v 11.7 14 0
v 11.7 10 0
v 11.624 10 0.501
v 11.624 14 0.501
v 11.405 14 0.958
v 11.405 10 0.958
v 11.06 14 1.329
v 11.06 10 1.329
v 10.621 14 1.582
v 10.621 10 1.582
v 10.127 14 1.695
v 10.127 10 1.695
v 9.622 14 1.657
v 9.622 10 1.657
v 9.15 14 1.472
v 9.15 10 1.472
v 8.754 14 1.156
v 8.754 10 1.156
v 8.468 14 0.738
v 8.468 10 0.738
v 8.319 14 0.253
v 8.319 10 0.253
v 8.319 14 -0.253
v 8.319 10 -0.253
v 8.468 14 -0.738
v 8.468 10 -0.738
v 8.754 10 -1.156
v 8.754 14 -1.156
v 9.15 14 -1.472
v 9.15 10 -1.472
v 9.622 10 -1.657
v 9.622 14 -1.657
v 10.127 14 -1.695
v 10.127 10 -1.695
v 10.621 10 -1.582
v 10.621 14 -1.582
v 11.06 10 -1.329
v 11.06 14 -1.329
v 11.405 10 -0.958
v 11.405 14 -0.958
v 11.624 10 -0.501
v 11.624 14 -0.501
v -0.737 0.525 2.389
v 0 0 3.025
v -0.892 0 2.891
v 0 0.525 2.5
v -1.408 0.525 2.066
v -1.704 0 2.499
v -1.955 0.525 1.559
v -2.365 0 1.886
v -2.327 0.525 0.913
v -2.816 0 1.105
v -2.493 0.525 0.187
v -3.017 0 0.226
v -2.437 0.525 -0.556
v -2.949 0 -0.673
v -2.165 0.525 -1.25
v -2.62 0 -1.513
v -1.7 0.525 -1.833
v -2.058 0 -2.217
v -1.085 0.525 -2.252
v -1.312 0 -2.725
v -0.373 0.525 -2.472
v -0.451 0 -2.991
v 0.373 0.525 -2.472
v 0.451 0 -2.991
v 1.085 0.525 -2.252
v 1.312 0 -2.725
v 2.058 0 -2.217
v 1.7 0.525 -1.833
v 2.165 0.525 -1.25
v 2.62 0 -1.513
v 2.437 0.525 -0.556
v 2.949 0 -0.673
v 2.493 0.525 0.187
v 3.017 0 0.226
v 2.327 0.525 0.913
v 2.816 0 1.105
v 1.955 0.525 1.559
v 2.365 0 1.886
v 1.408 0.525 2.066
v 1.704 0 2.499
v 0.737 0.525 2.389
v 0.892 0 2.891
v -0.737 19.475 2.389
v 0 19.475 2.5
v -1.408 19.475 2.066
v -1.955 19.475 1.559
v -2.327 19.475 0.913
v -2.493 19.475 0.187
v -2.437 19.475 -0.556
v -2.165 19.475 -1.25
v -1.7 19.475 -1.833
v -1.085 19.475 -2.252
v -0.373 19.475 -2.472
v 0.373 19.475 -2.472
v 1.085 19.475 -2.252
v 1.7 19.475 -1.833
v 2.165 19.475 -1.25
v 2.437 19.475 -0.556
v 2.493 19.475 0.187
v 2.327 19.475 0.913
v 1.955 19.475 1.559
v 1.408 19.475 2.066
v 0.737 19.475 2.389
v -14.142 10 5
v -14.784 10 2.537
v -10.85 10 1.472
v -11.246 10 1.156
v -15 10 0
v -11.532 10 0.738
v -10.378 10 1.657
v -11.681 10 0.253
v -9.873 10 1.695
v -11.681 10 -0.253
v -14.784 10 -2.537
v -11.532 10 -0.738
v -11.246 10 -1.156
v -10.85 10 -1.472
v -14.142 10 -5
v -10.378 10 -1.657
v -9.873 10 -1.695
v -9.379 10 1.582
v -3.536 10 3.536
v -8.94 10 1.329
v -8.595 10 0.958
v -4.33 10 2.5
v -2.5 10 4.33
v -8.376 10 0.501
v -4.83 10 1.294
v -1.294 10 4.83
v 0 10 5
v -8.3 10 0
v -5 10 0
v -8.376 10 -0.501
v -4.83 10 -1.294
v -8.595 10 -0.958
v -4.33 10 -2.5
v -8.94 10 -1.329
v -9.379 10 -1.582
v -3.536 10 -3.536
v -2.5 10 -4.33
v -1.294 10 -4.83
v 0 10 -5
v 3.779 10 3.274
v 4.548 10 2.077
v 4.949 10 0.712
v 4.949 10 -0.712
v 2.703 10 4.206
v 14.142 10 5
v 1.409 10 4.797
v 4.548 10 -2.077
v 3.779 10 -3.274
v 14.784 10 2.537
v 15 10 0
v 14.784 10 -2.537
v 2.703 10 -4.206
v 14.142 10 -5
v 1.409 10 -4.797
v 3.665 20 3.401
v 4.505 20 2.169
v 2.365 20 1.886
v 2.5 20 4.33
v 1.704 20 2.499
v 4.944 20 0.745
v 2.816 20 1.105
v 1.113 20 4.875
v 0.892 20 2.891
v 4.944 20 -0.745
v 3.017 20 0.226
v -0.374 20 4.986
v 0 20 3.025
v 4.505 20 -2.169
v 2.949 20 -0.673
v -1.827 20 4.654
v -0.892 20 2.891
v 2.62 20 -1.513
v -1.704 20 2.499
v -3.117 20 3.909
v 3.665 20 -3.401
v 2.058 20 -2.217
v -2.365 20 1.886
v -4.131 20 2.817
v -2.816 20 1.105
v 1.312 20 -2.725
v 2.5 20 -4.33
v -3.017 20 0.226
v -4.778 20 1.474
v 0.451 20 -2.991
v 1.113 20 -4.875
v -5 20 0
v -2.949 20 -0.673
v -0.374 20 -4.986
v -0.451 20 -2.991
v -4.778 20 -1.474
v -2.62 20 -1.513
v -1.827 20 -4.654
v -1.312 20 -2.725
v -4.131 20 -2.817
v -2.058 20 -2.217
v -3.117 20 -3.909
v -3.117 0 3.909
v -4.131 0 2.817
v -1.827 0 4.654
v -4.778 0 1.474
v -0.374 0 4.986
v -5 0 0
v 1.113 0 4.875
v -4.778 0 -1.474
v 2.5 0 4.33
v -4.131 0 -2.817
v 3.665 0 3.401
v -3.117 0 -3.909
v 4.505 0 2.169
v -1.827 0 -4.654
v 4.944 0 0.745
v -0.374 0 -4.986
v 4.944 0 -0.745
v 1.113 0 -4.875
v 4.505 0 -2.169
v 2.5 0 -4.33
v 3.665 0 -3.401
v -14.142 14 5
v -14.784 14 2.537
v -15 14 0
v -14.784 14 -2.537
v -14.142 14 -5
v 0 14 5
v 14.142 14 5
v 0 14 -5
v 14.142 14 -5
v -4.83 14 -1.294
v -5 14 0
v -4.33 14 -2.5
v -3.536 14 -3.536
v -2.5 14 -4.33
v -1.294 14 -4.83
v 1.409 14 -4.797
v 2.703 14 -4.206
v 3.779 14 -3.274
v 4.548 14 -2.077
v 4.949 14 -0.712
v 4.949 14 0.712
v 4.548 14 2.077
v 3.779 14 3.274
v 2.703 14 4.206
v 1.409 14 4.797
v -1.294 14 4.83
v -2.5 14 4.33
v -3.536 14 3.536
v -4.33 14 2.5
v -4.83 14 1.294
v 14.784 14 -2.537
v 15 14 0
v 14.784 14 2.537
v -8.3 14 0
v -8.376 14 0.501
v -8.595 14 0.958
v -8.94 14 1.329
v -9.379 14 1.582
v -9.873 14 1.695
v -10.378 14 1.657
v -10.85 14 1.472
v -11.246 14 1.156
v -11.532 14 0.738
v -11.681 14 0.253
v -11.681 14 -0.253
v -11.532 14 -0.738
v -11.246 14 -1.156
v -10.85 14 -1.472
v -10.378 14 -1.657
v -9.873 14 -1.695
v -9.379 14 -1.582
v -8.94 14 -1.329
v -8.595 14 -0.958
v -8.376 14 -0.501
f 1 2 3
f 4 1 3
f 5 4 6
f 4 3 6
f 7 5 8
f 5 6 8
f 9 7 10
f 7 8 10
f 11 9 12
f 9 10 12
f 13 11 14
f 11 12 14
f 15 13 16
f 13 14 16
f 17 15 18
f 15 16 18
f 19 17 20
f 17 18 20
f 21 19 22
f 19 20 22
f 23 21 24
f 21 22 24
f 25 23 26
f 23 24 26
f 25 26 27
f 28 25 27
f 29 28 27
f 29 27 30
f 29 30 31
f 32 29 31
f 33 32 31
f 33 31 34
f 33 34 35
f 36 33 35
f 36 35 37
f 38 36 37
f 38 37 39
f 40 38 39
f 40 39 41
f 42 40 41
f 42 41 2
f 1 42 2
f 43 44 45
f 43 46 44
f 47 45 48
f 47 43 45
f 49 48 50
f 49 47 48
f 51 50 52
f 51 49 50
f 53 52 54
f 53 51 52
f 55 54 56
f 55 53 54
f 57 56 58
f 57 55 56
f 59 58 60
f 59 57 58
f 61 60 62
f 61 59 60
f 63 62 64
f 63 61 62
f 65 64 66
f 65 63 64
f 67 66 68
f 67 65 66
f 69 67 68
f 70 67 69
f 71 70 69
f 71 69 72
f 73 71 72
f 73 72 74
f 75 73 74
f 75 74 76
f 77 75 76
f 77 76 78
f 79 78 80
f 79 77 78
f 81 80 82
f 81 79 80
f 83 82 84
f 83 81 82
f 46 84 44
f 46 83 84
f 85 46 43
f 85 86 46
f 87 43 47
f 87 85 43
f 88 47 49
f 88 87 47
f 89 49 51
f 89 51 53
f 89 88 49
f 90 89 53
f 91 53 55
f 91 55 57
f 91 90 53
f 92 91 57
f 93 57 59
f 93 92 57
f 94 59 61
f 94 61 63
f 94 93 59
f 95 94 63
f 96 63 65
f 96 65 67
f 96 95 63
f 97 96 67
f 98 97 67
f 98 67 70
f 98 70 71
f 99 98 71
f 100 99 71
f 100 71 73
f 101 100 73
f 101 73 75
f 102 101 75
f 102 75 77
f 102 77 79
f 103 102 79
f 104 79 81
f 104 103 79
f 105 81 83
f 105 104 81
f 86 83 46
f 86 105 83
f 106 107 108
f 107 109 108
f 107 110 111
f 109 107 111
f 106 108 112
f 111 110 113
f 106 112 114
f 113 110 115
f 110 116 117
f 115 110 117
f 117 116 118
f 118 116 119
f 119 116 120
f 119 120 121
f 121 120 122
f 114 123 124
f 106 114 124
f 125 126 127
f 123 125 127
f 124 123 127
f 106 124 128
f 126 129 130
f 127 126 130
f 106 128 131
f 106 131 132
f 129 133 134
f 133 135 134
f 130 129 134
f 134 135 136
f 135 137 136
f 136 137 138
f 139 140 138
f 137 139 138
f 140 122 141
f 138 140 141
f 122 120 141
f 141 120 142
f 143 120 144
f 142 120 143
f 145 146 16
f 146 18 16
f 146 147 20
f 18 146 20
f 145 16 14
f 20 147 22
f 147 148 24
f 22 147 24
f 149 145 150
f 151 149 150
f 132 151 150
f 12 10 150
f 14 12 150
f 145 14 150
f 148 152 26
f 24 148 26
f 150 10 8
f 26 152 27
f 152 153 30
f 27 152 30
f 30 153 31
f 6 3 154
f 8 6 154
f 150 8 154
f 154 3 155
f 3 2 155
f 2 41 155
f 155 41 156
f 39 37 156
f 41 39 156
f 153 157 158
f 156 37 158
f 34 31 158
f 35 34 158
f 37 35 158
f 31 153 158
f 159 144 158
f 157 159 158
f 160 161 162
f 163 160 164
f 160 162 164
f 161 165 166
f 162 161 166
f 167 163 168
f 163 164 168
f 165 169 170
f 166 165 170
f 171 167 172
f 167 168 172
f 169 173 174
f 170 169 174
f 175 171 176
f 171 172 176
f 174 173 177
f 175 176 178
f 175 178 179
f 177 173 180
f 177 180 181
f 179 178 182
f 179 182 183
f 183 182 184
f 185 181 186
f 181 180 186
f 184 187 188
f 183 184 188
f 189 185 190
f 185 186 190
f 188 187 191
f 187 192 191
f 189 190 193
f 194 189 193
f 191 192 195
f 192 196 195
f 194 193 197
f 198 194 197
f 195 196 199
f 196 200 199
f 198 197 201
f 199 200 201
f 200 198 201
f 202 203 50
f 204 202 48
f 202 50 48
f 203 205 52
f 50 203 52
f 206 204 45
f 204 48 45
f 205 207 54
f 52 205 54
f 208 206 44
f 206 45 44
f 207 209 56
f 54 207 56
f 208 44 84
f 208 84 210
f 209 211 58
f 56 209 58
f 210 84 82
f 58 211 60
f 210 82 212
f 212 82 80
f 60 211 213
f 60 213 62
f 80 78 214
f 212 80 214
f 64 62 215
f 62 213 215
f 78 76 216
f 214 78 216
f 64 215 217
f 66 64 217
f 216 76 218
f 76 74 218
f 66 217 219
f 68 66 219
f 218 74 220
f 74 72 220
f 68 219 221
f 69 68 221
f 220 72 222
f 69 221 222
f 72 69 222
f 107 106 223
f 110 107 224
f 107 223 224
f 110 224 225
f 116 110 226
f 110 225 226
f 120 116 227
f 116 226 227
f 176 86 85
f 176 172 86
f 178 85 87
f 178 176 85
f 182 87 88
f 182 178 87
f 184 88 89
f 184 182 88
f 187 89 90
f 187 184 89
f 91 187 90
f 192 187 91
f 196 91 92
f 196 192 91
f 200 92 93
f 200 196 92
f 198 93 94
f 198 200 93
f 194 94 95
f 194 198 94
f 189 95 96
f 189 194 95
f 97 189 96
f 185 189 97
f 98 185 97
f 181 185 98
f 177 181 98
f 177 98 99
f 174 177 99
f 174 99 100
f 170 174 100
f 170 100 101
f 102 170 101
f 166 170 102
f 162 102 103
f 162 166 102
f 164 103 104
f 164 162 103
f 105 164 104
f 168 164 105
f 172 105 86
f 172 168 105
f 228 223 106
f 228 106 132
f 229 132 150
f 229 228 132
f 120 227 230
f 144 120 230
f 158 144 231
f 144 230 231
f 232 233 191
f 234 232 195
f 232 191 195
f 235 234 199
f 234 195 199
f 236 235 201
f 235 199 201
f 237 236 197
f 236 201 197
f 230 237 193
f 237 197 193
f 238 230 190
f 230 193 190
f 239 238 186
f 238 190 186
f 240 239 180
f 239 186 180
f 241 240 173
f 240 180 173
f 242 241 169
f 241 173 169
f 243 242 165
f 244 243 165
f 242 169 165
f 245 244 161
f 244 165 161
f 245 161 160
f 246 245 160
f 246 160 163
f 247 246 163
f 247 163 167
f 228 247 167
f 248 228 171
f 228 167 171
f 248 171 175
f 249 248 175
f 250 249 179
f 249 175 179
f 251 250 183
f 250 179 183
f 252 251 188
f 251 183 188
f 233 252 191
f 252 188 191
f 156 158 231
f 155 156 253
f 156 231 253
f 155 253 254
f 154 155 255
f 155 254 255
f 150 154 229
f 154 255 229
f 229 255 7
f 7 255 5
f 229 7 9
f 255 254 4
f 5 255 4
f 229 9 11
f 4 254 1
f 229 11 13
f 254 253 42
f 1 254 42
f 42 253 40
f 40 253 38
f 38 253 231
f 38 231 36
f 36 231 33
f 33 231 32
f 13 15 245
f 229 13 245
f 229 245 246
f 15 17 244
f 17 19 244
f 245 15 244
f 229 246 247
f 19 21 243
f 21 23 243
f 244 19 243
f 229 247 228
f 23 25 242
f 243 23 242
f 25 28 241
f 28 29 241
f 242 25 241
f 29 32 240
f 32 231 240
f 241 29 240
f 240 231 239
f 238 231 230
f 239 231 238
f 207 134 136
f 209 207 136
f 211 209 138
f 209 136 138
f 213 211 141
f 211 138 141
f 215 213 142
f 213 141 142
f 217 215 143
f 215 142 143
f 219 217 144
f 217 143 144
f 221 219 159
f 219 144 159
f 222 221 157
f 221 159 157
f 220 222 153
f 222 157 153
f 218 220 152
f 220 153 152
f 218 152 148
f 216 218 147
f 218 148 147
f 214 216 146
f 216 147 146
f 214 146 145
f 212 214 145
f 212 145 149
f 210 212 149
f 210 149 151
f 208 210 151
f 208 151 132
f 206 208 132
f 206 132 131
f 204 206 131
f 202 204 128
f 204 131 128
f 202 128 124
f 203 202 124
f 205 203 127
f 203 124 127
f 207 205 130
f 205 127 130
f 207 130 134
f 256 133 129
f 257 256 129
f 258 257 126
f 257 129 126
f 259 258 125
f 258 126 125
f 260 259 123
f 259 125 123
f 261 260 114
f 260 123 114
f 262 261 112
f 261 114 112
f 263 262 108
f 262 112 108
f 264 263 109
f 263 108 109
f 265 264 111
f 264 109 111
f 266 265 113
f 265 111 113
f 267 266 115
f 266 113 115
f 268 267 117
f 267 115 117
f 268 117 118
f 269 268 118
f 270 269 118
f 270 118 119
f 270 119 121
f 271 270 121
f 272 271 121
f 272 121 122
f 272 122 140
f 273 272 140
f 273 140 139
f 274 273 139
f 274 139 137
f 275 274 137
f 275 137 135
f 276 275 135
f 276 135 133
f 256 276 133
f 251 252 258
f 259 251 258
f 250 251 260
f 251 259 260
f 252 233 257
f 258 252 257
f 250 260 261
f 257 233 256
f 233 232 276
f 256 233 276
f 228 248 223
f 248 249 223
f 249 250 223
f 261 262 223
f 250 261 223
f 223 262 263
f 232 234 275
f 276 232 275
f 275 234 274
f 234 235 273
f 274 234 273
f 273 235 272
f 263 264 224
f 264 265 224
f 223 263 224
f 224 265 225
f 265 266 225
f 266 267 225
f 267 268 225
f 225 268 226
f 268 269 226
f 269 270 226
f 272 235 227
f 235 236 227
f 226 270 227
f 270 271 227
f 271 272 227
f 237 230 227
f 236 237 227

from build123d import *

# Parameters (mm, degrees)
M3_CLEARANCE_HOLE1_D = 3.4
SKETCH9_OUTSIDE_W    = 41.38
SKETCH9_OUTSIDE_H    = 41.38
SKETCH9_OUTSIDE_W_2  = 30
SKETCH9_OUTSIDE_H_2  = 10
CUT_EXTRUDE1_DEPTH   = 26.416530054


with BuildPart() as part:
    # Sketch2 → Revolve1 (revolve)
    with BuildSketch(Plane.XY):
        Polygon((0, 0), (-5, 0), (-5, 10), (-15, 10), (-15, 14), (-5, 14), (-5, 20), (0, 20), align=None)
    revolve(axis=Axis((0, 20, 0), (0, -1, 0)))

    # M3 Clearance Hole1 (through all)
    with Locations(Plane(origin=(0, 14, 0), x_dir=(-1, 0, 0), z_dir=(0, 1, 0))):
        with Locations((10, 0), (-10, 0)):
            Hole(M3_CLEARANCE_HOLE1_D / 2)

    # Sketch8 → M6 Tapped Hole1 (revolve, cut)
    with BuildSketch(Plane(origin=(0, 20, 0), x_dir=(0, 0, 1), z_dir=(1, 0, 0))):
        Polygon((0, 0), (0, 20), (3.025, 20), (2.5, 19.475), (2.5, 0.525), (3.025, 0), align=None)
    revolve(axis=Axis((0, 26.35, 0), (0, -1, 0)), mode=Mode.SUBTRACT)

    # Sketch9 outside → Cut-Extrude1 (cut, through all)
    with BuildSketch(Plane(origin=(0, 14, 0), x_dir=(1, 0, 0), z_dir=(0, 1, 0))):
        Rectangle(SKETCH9_OUTSIDE_W, SKETCH9_OUTSIDE_H)
        Rectangle(SKETCH9_OUTSIDE_W_2, SKETCH9_OUTSIDE_H_2, mode=Mode.SUBTRACT)
    extrude(amount=-CUT_EXTRUDE1_DEPTH, mode=Mode.SUBTRACT)


solid = part.part
